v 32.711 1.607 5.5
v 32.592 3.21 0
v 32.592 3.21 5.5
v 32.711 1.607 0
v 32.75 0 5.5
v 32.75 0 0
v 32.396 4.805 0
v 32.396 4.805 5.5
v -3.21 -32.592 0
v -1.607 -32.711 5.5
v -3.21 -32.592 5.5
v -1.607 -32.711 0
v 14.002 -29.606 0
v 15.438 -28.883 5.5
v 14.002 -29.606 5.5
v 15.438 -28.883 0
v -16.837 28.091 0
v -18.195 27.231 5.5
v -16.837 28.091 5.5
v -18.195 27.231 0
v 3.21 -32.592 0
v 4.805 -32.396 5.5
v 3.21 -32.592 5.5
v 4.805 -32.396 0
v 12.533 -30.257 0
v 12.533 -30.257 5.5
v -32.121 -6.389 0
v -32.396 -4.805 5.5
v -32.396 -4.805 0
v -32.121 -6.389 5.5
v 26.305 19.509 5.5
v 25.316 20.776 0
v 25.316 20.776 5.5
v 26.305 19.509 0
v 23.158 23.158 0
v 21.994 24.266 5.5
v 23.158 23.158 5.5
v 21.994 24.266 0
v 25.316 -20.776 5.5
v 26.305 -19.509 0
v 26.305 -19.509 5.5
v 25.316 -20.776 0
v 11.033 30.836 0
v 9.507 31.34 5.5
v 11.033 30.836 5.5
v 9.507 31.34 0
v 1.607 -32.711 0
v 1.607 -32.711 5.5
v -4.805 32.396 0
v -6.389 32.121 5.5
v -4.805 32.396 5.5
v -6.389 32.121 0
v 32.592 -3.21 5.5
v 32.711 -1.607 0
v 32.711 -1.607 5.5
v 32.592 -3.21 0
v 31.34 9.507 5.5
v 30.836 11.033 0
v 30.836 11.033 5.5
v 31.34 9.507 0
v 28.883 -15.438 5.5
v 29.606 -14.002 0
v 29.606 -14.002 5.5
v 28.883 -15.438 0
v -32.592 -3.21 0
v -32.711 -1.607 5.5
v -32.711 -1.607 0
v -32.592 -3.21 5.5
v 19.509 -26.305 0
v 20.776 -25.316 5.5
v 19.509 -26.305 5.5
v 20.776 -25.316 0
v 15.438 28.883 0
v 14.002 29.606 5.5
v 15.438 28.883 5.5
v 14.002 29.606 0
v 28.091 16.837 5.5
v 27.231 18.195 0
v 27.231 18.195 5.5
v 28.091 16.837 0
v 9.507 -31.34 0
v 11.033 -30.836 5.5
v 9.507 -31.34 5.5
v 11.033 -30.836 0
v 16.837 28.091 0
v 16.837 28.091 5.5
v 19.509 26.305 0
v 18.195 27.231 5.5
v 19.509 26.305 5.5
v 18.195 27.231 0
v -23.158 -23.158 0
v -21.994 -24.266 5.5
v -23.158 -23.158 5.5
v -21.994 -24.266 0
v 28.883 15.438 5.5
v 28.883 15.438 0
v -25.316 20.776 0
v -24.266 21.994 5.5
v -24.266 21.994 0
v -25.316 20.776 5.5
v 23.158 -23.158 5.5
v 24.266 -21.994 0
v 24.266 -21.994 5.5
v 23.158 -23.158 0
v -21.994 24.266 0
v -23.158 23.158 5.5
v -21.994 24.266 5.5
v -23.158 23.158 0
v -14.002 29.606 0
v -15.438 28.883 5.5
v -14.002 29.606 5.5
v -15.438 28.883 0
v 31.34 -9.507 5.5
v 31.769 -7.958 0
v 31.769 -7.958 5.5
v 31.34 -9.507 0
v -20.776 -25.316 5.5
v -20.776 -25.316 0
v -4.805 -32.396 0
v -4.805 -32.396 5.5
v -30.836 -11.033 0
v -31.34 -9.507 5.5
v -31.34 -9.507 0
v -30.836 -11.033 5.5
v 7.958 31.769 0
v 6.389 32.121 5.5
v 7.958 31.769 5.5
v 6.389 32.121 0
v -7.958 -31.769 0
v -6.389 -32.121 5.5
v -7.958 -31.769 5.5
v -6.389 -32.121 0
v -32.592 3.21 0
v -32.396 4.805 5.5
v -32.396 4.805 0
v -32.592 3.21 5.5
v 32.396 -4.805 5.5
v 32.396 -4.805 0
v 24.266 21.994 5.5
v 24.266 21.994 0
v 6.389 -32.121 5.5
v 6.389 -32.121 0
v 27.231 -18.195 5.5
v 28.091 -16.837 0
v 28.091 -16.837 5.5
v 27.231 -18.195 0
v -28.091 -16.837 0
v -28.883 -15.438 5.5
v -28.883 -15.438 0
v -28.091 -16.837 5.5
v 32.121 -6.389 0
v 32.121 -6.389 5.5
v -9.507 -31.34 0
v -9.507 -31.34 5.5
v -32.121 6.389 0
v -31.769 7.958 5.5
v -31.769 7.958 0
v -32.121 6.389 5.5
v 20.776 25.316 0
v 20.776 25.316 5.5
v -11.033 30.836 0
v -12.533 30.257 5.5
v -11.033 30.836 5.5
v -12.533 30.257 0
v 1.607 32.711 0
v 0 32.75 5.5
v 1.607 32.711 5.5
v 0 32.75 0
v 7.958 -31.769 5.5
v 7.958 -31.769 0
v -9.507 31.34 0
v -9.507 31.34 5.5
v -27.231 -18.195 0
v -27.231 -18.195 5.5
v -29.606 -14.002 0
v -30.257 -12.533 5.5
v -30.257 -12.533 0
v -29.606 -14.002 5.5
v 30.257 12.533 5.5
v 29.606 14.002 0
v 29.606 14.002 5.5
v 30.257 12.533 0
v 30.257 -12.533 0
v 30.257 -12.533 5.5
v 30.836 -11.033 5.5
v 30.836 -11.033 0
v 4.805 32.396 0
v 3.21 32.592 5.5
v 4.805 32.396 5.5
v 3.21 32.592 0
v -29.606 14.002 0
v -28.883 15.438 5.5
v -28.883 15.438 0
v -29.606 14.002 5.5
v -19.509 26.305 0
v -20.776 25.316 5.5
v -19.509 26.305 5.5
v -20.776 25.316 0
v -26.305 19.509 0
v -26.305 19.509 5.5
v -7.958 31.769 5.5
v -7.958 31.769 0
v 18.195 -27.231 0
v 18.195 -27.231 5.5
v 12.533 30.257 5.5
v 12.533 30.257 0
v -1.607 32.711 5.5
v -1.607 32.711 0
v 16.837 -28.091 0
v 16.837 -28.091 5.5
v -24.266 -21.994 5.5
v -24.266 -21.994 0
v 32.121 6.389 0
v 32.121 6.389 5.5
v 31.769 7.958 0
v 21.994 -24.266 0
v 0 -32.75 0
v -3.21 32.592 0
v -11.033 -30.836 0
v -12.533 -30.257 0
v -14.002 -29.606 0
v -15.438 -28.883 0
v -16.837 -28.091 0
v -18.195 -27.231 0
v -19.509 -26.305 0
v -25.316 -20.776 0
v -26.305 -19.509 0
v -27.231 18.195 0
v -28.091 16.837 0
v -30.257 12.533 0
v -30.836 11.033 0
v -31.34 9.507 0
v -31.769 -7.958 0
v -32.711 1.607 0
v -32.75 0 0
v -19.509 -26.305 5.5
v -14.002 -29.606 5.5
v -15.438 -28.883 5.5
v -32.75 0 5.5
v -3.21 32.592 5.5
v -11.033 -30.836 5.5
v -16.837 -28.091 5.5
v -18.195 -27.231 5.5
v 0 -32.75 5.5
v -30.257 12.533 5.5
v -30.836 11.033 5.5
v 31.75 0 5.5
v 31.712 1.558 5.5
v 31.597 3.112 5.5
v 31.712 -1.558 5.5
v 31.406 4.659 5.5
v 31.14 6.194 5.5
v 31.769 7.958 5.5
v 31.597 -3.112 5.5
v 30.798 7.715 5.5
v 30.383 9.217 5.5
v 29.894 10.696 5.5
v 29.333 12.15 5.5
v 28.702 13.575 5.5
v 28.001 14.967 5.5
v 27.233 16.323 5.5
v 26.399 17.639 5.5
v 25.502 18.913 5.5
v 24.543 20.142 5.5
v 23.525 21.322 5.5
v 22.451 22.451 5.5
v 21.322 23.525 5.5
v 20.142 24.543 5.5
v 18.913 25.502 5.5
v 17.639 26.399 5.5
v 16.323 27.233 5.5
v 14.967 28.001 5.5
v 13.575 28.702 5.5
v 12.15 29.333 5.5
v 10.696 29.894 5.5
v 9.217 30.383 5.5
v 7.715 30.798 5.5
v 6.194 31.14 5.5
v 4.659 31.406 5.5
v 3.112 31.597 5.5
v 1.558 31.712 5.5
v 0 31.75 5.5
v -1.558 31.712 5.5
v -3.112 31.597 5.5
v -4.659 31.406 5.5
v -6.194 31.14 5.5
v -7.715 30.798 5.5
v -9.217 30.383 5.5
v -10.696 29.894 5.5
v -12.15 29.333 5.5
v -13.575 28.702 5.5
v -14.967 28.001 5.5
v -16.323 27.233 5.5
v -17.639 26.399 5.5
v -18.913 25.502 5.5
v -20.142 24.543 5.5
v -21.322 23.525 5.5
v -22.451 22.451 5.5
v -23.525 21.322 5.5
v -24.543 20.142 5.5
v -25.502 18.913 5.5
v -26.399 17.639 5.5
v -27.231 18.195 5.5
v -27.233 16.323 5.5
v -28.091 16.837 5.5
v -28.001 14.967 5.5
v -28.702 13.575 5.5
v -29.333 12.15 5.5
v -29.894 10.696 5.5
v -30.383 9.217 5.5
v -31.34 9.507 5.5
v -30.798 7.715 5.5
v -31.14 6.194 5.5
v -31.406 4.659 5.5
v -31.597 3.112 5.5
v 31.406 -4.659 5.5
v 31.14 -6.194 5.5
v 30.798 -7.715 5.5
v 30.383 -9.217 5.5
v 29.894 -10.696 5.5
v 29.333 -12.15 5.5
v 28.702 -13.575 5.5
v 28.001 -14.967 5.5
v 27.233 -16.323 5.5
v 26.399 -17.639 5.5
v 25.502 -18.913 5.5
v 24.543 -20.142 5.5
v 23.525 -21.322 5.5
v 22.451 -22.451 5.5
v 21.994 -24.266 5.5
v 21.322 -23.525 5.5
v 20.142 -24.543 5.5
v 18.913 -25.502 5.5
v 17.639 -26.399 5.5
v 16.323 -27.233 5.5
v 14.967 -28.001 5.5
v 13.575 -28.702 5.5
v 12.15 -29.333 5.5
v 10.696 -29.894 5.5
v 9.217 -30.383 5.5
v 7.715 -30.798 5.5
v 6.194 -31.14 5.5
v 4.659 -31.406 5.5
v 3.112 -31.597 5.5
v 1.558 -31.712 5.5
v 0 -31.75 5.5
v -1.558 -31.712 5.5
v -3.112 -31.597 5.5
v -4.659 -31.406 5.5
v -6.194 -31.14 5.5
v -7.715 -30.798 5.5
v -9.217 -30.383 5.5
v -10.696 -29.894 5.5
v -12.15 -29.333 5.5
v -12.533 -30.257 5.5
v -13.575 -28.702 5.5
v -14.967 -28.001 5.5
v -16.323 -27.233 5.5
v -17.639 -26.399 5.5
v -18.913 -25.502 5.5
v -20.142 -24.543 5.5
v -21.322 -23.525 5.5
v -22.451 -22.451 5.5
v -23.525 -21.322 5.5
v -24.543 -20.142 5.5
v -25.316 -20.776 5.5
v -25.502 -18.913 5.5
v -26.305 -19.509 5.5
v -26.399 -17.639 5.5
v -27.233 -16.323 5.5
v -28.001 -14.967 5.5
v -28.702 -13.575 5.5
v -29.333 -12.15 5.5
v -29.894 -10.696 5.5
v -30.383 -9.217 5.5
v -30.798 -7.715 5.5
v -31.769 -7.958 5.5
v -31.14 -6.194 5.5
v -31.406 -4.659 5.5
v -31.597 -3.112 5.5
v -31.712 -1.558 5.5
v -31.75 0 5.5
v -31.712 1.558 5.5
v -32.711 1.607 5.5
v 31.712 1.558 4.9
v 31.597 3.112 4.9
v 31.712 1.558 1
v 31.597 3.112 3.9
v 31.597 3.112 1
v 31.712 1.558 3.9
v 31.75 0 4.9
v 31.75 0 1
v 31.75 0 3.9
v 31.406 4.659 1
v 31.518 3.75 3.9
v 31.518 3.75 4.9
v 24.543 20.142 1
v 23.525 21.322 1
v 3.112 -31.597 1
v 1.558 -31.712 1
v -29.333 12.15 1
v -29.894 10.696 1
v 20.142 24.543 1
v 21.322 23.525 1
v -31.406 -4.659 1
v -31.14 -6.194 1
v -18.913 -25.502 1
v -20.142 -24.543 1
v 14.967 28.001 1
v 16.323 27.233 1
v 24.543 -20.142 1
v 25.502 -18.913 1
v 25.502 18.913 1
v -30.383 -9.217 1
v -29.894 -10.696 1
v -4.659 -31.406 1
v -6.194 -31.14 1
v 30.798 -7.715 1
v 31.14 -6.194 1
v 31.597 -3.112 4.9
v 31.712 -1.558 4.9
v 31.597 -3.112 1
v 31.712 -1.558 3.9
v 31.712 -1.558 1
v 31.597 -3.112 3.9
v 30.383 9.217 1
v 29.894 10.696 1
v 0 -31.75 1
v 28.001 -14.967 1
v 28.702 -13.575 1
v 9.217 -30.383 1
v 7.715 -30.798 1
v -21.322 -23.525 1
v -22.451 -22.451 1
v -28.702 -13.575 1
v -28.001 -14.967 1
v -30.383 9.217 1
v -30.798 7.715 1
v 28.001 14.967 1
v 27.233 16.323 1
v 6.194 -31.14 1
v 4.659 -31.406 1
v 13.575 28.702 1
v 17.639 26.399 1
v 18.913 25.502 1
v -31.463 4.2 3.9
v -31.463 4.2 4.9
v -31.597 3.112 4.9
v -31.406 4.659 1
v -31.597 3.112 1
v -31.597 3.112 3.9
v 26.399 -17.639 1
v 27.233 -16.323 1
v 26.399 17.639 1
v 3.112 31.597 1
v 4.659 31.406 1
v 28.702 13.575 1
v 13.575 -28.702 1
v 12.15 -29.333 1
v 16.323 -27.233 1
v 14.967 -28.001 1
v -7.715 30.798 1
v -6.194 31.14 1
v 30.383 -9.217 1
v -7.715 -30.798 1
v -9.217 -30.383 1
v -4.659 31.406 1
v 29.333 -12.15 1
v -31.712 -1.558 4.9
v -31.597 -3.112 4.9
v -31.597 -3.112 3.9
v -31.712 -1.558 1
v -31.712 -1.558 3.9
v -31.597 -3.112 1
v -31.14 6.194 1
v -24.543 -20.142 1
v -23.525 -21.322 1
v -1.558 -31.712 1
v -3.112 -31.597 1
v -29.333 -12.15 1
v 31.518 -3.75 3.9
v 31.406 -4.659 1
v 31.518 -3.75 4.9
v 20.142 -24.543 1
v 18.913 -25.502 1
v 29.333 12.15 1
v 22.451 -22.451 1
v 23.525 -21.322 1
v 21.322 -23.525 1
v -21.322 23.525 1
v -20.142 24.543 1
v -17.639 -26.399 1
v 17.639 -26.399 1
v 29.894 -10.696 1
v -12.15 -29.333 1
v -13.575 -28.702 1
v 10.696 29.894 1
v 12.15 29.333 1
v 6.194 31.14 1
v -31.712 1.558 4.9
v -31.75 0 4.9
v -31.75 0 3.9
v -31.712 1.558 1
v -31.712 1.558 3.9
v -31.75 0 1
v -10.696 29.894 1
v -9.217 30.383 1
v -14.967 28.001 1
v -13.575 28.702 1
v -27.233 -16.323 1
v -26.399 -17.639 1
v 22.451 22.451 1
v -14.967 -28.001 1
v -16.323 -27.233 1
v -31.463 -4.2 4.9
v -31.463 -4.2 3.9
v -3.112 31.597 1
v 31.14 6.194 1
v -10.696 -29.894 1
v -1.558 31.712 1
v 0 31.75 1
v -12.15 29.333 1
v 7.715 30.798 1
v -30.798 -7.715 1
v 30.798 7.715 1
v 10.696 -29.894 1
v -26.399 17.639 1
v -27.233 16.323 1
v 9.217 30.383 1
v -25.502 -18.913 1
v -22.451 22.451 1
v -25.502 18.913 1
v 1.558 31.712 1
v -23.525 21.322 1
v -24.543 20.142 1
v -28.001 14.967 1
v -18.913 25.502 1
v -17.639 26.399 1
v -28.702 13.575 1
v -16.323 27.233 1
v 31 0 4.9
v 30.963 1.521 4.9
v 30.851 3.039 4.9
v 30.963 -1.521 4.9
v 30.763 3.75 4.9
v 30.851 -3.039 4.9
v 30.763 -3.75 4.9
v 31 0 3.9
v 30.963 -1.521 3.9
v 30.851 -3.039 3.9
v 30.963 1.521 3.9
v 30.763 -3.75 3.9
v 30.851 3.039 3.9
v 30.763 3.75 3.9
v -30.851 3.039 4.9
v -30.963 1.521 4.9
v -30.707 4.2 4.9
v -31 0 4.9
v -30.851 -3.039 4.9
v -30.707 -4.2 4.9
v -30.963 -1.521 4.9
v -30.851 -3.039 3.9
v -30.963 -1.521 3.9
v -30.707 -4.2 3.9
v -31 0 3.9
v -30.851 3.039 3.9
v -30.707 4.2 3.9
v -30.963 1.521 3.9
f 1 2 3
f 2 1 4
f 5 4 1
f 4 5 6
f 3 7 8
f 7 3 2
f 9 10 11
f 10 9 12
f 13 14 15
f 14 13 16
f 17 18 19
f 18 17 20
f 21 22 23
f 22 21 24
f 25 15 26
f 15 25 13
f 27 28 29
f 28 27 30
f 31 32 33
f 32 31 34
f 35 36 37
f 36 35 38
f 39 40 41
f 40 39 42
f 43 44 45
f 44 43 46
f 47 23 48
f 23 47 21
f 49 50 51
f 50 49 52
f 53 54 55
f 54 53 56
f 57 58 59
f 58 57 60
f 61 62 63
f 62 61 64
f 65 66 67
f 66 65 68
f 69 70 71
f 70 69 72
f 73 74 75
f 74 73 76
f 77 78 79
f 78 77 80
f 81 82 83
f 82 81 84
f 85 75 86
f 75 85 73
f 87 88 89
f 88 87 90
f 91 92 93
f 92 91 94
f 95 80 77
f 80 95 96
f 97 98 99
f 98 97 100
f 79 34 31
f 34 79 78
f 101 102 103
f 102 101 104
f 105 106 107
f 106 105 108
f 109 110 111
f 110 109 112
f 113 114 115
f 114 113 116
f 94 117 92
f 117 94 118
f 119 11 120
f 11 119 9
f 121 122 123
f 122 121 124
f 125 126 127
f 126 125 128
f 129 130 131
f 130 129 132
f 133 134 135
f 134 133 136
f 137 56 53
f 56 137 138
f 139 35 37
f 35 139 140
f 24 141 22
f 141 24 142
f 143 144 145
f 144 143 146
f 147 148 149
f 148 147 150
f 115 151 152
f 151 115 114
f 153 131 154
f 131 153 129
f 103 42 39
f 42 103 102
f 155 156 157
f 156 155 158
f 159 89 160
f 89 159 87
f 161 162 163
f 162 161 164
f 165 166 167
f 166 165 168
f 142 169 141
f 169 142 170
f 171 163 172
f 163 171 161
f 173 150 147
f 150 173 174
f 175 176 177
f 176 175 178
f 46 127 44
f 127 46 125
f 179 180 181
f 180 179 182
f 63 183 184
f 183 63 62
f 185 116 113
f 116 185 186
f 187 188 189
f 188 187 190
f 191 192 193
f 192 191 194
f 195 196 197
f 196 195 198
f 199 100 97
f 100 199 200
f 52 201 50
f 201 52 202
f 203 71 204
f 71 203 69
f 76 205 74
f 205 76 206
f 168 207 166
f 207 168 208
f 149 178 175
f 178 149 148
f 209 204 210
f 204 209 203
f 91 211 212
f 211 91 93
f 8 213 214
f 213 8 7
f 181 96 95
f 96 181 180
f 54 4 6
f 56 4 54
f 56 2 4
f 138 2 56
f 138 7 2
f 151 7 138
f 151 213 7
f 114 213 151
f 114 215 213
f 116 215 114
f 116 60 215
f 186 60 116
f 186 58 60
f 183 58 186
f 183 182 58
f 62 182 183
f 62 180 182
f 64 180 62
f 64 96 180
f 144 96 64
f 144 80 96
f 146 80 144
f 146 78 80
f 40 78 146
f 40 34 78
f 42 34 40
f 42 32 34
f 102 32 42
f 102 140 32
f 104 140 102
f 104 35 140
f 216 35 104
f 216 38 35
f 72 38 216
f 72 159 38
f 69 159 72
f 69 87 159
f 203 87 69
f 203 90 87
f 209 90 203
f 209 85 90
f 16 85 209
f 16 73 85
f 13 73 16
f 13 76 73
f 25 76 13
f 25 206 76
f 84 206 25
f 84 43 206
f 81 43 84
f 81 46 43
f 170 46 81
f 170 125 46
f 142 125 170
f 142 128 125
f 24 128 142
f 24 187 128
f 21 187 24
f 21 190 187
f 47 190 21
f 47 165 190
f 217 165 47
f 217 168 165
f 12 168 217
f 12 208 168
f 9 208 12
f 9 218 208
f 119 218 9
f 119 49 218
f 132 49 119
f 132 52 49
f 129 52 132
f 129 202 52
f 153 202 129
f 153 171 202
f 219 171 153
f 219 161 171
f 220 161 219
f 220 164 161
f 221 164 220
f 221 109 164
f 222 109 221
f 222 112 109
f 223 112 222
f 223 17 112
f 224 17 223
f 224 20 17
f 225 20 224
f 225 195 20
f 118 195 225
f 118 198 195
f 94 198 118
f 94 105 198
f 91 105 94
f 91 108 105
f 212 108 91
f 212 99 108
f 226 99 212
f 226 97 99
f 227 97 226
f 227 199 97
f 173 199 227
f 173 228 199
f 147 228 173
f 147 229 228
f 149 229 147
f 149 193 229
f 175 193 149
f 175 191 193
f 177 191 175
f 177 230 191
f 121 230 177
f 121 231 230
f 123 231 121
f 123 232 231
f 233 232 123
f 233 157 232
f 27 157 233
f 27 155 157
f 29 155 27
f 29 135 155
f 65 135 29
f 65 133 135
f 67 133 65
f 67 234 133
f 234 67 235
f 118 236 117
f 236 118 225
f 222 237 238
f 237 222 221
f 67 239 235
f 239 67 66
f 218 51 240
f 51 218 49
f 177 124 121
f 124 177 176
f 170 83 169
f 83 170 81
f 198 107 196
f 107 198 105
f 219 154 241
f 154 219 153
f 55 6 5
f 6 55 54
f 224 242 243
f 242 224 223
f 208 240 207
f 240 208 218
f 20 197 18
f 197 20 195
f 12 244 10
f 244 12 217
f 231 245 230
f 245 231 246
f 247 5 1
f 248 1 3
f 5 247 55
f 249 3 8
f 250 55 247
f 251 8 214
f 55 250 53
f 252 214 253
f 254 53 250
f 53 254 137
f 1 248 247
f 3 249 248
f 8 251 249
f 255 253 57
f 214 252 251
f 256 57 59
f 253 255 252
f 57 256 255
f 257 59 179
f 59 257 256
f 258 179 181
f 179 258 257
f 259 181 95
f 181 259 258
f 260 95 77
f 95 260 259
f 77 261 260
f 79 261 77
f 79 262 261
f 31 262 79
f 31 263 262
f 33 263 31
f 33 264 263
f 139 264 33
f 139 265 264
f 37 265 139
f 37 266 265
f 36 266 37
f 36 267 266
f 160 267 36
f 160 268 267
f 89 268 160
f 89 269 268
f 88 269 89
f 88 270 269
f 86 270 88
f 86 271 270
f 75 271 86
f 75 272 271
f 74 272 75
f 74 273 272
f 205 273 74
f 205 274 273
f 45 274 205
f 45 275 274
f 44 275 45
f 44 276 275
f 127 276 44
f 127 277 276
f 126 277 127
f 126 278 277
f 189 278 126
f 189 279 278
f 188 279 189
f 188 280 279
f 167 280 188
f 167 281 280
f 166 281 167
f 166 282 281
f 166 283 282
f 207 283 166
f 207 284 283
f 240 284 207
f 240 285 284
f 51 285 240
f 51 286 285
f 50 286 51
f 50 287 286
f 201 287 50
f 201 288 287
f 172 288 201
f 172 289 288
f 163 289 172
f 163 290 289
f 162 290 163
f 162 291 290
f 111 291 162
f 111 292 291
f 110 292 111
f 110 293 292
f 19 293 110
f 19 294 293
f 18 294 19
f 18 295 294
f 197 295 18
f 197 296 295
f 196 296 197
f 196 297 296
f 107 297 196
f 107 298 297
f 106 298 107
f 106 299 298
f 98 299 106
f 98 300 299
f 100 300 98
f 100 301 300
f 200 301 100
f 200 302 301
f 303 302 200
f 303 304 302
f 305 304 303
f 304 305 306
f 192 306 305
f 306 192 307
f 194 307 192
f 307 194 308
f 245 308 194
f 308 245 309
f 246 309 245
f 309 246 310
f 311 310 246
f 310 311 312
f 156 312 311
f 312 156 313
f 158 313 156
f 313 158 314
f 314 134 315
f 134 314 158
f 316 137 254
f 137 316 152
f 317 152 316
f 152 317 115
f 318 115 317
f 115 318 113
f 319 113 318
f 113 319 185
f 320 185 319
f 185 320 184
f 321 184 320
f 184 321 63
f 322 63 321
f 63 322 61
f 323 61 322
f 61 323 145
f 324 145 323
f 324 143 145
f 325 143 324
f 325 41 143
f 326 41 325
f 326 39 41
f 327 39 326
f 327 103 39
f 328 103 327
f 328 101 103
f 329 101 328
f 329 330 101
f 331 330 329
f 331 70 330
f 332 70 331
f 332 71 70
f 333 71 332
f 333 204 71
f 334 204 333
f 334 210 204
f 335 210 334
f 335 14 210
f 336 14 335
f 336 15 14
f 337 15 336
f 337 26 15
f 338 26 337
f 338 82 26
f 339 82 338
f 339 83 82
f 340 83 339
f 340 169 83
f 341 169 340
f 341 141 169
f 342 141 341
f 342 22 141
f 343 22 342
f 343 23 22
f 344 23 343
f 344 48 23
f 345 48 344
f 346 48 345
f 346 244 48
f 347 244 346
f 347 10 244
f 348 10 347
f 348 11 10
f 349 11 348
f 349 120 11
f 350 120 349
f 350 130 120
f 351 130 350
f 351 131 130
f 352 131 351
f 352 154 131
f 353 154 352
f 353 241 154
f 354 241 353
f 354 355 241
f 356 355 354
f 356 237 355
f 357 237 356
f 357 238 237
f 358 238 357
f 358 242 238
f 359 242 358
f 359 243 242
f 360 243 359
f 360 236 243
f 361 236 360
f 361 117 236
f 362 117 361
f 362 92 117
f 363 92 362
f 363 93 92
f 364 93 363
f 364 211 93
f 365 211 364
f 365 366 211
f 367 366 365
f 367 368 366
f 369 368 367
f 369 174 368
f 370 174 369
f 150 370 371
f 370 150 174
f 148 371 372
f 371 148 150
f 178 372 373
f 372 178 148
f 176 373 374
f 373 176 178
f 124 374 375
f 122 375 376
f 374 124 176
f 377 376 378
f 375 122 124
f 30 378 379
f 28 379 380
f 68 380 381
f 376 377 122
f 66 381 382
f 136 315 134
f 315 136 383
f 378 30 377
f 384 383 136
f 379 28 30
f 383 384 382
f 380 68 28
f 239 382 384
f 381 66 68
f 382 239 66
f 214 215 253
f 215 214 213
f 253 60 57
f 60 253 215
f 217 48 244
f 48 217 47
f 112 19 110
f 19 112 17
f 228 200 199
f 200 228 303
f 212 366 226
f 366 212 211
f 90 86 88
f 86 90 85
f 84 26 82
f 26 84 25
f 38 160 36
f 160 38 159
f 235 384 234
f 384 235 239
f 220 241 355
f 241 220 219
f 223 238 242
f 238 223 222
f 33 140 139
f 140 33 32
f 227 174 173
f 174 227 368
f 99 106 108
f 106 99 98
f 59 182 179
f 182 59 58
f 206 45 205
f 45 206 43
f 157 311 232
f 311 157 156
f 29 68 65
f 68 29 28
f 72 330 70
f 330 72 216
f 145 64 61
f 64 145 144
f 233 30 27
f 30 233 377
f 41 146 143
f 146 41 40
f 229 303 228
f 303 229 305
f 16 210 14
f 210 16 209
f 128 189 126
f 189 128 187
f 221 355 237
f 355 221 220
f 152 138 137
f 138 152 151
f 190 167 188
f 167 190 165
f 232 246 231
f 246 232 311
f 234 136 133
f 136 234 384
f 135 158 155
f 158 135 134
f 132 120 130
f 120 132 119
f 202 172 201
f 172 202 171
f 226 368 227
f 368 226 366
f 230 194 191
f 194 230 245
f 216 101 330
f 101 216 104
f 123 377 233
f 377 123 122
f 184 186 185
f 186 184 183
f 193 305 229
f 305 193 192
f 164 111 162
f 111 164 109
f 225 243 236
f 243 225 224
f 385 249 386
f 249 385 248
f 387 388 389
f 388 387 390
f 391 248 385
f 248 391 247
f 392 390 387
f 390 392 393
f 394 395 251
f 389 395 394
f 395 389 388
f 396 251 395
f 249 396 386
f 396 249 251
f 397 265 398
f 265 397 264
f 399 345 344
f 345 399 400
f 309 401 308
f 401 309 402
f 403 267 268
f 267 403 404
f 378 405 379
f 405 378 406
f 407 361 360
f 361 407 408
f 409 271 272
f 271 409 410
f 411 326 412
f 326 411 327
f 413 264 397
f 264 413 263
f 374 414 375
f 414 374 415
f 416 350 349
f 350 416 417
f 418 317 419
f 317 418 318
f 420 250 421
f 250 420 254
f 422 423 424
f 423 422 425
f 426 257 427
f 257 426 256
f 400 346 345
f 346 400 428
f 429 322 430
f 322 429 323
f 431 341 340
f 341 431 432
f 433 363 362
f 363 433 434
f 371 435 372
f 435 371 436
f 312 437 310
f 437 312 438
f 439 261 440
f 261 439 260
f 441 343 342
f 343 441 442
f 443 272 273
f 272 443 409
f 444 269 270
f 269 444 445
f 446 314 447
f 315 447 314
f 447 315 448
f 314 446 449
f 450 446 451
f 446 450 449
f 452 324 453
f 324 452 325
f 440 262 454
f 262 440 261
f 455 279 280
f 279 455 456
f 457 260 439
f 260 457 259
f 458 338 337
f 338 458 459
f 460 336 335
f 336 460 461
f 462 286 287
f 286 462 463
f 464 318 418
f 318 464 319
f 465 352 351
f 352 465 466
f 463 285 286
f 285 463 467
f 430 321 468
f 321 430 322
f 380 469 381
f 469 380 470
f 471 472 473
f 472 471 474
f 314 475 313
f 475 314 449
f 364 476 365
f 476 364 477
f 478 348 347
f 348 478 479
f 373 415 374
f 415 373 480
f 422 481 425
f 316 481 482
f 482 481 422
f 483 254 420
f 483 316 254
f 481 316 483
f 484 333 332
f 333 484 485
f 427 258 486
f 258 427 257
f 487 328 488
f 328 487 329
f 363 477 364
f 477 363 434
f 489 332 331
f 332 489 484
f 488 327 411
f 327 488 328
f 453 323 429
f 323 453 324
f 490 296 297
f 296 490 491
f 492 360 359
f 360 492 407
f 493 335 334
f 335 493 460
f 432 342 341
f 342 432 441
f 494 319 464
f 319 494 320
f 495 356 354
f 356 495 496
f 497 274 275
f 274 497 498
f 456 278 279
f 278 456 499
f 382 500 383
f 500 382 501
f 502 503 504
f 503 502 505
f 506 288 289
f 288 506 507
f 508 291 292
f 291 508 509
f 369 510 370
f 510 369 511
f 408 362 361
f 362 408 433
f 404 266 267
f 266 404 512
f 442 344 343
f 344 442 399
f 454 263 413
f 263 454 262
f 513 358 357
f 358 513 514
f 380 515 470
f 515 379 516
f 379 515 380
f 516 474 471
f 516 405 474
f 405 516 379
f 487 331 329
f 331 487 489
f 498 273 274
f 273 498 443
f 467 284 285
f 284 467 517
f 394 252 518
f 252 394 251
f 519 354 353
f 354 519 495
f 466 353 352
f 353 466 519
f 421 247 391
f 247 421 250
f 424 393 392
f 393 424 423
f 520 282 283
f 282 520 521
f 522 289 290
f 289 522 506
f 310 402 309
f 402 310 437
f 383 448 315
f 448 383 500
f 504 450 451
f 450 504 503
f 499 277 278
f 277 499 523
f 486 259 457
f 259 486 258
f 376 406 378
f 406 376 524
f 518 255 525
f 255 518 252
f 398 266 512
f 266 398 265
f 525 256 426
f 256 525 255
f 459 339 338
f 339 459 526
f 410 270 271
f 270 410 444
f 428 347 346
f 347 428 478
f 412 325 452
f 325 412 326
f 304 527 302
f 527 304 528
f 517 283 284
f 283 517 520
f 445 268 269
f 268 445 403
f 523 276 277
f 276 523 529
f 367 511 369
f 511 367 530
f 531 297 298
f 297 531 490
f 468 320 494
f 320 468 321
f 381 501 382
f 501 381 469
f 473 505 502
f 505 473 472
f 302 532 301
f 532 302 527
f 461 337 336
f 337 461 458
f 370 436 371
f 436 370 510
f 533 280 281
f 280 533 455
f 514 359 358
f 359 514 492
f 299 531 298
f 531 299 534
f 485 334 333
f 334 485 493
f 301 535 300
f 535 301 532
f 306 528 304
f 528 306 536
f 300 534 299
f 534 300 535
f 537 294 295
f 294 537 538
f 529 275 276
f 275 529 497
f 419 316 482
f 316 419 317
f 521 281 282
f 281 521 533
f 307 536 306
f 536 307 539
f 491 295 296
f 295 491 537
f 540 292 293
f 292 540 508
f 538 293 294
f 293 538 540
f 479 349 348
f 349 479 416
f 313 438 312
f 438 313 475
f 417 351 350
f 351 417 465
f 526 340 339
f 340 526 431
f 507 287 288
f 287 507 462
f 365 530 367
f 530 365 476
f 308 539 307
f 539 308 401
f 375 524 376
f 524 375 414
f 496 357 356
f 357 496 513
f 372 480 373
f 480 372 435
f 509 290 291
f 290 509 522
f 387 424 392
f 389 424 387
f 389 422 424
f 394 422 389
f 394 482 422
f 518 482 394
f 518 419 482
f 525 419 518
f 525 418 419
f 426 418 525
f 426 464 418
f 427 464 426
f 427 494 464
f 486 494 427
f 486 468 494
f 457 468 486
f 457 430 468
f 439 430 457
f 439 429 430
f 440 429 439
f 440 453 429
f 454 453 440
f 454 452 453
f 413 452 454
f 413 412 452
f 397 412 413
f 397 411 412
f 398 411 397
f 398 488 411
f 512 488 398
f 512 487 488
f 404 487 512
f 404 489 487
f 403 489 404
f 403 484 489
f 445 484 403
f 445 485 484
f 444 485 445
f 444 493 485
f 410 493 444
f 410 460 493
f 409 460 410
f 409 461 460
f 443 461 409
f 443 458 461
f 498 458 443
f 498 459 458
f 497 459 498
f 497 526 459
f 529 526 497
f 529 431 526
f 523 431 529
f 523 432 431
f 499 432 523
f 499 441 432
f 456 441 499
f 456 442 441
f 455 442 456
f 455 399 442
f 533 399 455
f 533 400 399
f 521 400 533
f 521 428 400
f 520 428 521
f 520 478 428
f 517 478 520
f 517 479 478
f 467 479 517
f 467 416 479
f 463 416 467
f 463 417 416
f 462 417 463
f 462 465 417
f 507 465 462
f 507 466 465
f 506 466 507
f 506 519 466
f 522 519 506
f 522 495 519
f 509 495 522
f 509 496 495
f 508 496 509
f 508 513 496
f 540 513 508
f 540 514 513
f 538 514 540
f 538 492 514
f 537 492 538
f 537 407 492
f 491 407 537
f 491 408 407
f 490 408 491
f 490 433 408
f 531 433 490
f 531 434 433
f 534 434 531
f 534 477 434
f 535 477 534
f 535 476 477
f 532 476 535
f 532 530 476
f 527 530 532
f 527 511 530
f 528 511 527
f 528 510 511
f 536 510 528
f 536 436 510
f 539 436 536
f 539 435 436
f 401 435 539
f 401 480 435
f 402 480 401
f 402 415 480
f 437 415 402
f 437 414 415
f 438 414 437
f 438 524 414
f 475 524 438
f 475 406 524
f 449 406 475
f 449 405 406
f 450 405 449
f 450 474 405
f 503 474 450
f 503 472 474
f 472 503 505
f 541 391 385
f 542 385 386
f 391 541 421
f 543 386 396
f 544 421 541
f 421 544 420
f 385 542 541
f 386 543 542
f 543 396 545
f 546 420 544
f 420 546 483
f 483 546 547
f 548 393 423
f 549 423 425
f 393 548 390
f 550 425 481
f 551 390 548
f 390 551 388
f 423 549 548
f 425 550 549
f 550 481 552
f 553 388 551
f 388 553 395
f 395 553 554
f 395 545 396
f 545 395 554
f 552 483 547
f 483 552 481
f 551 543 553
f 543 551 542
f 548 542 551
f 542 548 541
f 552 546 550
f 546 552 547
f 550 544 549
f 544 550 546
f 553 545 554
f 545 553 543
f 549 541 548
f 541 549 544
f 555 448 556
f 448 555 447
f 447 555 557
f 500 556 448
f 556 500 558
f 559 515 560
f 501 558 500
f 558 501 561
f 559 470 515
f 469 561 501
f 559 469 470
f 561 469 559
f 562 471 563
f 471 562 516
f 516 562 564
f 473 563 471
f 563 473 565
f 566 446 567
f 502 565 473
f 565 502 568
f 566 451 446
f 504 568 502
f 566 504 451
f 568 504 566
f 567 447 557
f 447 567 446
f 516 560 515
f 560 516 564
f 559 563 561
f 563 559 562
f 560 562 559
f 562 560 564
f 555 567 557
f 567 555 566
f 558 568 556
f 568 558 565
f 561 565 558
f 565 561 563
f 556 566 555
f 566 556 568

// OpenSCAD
//Lense cap for Canon EOS 700D
//Can be fitted for all lenses that screw in
//


$fn=128;

//Wall strengh of sides
thickness=1;
//Inner diameter
idiam=63;   
//Height
lidh=5.5;
//Give in Friction fit
looseness=5;

loose=looseness/10; // ie looseness = 5 loose = 0.5mm

lid(); 

//-----------------------------------------------------------------------
module tube(d,h,th) {  // d= outside diam
rad=d/2;
difference() {
	cylinder(h=h,r=rad);
	cylinder(h=h,r=rad-th);
	}
}

module lid(){
union() {
	tube(idiam+thickness*2+loose,lidh,thickness); // sides
	tube(idiam+thickness*2+loose,thickness,idiam+thickness*2+loose); // base
	
}
}
//Screw-Lip
//Pin that screws sticks 1mm inwards 
//and is 1mm thick
difference(){
    translate([idiam/2-0.1, 0, lidh-1.1])
    cube(size = [2, lidh+2, 1], center = true);
    
    rotate([0, 0, 90])
    translate([0, 0, 2])
    cylinder(h = lidh+2.9, r=(idiam/2)-0.5, center = true, $fn=128);
}
//Mirrowed Screw-Lip
difference() {
    translate([-idiam/2+0.1, 0, lidh-1.1])
    cube(size = [2, lidh+2.9, 1], center = true);
    
    rotate([0, 0, 90])
    translate([0, 0, 2])
    cylinder(h = lidh+1, r=(idiam/2)-0.5, center = true, $fn=128);
}
